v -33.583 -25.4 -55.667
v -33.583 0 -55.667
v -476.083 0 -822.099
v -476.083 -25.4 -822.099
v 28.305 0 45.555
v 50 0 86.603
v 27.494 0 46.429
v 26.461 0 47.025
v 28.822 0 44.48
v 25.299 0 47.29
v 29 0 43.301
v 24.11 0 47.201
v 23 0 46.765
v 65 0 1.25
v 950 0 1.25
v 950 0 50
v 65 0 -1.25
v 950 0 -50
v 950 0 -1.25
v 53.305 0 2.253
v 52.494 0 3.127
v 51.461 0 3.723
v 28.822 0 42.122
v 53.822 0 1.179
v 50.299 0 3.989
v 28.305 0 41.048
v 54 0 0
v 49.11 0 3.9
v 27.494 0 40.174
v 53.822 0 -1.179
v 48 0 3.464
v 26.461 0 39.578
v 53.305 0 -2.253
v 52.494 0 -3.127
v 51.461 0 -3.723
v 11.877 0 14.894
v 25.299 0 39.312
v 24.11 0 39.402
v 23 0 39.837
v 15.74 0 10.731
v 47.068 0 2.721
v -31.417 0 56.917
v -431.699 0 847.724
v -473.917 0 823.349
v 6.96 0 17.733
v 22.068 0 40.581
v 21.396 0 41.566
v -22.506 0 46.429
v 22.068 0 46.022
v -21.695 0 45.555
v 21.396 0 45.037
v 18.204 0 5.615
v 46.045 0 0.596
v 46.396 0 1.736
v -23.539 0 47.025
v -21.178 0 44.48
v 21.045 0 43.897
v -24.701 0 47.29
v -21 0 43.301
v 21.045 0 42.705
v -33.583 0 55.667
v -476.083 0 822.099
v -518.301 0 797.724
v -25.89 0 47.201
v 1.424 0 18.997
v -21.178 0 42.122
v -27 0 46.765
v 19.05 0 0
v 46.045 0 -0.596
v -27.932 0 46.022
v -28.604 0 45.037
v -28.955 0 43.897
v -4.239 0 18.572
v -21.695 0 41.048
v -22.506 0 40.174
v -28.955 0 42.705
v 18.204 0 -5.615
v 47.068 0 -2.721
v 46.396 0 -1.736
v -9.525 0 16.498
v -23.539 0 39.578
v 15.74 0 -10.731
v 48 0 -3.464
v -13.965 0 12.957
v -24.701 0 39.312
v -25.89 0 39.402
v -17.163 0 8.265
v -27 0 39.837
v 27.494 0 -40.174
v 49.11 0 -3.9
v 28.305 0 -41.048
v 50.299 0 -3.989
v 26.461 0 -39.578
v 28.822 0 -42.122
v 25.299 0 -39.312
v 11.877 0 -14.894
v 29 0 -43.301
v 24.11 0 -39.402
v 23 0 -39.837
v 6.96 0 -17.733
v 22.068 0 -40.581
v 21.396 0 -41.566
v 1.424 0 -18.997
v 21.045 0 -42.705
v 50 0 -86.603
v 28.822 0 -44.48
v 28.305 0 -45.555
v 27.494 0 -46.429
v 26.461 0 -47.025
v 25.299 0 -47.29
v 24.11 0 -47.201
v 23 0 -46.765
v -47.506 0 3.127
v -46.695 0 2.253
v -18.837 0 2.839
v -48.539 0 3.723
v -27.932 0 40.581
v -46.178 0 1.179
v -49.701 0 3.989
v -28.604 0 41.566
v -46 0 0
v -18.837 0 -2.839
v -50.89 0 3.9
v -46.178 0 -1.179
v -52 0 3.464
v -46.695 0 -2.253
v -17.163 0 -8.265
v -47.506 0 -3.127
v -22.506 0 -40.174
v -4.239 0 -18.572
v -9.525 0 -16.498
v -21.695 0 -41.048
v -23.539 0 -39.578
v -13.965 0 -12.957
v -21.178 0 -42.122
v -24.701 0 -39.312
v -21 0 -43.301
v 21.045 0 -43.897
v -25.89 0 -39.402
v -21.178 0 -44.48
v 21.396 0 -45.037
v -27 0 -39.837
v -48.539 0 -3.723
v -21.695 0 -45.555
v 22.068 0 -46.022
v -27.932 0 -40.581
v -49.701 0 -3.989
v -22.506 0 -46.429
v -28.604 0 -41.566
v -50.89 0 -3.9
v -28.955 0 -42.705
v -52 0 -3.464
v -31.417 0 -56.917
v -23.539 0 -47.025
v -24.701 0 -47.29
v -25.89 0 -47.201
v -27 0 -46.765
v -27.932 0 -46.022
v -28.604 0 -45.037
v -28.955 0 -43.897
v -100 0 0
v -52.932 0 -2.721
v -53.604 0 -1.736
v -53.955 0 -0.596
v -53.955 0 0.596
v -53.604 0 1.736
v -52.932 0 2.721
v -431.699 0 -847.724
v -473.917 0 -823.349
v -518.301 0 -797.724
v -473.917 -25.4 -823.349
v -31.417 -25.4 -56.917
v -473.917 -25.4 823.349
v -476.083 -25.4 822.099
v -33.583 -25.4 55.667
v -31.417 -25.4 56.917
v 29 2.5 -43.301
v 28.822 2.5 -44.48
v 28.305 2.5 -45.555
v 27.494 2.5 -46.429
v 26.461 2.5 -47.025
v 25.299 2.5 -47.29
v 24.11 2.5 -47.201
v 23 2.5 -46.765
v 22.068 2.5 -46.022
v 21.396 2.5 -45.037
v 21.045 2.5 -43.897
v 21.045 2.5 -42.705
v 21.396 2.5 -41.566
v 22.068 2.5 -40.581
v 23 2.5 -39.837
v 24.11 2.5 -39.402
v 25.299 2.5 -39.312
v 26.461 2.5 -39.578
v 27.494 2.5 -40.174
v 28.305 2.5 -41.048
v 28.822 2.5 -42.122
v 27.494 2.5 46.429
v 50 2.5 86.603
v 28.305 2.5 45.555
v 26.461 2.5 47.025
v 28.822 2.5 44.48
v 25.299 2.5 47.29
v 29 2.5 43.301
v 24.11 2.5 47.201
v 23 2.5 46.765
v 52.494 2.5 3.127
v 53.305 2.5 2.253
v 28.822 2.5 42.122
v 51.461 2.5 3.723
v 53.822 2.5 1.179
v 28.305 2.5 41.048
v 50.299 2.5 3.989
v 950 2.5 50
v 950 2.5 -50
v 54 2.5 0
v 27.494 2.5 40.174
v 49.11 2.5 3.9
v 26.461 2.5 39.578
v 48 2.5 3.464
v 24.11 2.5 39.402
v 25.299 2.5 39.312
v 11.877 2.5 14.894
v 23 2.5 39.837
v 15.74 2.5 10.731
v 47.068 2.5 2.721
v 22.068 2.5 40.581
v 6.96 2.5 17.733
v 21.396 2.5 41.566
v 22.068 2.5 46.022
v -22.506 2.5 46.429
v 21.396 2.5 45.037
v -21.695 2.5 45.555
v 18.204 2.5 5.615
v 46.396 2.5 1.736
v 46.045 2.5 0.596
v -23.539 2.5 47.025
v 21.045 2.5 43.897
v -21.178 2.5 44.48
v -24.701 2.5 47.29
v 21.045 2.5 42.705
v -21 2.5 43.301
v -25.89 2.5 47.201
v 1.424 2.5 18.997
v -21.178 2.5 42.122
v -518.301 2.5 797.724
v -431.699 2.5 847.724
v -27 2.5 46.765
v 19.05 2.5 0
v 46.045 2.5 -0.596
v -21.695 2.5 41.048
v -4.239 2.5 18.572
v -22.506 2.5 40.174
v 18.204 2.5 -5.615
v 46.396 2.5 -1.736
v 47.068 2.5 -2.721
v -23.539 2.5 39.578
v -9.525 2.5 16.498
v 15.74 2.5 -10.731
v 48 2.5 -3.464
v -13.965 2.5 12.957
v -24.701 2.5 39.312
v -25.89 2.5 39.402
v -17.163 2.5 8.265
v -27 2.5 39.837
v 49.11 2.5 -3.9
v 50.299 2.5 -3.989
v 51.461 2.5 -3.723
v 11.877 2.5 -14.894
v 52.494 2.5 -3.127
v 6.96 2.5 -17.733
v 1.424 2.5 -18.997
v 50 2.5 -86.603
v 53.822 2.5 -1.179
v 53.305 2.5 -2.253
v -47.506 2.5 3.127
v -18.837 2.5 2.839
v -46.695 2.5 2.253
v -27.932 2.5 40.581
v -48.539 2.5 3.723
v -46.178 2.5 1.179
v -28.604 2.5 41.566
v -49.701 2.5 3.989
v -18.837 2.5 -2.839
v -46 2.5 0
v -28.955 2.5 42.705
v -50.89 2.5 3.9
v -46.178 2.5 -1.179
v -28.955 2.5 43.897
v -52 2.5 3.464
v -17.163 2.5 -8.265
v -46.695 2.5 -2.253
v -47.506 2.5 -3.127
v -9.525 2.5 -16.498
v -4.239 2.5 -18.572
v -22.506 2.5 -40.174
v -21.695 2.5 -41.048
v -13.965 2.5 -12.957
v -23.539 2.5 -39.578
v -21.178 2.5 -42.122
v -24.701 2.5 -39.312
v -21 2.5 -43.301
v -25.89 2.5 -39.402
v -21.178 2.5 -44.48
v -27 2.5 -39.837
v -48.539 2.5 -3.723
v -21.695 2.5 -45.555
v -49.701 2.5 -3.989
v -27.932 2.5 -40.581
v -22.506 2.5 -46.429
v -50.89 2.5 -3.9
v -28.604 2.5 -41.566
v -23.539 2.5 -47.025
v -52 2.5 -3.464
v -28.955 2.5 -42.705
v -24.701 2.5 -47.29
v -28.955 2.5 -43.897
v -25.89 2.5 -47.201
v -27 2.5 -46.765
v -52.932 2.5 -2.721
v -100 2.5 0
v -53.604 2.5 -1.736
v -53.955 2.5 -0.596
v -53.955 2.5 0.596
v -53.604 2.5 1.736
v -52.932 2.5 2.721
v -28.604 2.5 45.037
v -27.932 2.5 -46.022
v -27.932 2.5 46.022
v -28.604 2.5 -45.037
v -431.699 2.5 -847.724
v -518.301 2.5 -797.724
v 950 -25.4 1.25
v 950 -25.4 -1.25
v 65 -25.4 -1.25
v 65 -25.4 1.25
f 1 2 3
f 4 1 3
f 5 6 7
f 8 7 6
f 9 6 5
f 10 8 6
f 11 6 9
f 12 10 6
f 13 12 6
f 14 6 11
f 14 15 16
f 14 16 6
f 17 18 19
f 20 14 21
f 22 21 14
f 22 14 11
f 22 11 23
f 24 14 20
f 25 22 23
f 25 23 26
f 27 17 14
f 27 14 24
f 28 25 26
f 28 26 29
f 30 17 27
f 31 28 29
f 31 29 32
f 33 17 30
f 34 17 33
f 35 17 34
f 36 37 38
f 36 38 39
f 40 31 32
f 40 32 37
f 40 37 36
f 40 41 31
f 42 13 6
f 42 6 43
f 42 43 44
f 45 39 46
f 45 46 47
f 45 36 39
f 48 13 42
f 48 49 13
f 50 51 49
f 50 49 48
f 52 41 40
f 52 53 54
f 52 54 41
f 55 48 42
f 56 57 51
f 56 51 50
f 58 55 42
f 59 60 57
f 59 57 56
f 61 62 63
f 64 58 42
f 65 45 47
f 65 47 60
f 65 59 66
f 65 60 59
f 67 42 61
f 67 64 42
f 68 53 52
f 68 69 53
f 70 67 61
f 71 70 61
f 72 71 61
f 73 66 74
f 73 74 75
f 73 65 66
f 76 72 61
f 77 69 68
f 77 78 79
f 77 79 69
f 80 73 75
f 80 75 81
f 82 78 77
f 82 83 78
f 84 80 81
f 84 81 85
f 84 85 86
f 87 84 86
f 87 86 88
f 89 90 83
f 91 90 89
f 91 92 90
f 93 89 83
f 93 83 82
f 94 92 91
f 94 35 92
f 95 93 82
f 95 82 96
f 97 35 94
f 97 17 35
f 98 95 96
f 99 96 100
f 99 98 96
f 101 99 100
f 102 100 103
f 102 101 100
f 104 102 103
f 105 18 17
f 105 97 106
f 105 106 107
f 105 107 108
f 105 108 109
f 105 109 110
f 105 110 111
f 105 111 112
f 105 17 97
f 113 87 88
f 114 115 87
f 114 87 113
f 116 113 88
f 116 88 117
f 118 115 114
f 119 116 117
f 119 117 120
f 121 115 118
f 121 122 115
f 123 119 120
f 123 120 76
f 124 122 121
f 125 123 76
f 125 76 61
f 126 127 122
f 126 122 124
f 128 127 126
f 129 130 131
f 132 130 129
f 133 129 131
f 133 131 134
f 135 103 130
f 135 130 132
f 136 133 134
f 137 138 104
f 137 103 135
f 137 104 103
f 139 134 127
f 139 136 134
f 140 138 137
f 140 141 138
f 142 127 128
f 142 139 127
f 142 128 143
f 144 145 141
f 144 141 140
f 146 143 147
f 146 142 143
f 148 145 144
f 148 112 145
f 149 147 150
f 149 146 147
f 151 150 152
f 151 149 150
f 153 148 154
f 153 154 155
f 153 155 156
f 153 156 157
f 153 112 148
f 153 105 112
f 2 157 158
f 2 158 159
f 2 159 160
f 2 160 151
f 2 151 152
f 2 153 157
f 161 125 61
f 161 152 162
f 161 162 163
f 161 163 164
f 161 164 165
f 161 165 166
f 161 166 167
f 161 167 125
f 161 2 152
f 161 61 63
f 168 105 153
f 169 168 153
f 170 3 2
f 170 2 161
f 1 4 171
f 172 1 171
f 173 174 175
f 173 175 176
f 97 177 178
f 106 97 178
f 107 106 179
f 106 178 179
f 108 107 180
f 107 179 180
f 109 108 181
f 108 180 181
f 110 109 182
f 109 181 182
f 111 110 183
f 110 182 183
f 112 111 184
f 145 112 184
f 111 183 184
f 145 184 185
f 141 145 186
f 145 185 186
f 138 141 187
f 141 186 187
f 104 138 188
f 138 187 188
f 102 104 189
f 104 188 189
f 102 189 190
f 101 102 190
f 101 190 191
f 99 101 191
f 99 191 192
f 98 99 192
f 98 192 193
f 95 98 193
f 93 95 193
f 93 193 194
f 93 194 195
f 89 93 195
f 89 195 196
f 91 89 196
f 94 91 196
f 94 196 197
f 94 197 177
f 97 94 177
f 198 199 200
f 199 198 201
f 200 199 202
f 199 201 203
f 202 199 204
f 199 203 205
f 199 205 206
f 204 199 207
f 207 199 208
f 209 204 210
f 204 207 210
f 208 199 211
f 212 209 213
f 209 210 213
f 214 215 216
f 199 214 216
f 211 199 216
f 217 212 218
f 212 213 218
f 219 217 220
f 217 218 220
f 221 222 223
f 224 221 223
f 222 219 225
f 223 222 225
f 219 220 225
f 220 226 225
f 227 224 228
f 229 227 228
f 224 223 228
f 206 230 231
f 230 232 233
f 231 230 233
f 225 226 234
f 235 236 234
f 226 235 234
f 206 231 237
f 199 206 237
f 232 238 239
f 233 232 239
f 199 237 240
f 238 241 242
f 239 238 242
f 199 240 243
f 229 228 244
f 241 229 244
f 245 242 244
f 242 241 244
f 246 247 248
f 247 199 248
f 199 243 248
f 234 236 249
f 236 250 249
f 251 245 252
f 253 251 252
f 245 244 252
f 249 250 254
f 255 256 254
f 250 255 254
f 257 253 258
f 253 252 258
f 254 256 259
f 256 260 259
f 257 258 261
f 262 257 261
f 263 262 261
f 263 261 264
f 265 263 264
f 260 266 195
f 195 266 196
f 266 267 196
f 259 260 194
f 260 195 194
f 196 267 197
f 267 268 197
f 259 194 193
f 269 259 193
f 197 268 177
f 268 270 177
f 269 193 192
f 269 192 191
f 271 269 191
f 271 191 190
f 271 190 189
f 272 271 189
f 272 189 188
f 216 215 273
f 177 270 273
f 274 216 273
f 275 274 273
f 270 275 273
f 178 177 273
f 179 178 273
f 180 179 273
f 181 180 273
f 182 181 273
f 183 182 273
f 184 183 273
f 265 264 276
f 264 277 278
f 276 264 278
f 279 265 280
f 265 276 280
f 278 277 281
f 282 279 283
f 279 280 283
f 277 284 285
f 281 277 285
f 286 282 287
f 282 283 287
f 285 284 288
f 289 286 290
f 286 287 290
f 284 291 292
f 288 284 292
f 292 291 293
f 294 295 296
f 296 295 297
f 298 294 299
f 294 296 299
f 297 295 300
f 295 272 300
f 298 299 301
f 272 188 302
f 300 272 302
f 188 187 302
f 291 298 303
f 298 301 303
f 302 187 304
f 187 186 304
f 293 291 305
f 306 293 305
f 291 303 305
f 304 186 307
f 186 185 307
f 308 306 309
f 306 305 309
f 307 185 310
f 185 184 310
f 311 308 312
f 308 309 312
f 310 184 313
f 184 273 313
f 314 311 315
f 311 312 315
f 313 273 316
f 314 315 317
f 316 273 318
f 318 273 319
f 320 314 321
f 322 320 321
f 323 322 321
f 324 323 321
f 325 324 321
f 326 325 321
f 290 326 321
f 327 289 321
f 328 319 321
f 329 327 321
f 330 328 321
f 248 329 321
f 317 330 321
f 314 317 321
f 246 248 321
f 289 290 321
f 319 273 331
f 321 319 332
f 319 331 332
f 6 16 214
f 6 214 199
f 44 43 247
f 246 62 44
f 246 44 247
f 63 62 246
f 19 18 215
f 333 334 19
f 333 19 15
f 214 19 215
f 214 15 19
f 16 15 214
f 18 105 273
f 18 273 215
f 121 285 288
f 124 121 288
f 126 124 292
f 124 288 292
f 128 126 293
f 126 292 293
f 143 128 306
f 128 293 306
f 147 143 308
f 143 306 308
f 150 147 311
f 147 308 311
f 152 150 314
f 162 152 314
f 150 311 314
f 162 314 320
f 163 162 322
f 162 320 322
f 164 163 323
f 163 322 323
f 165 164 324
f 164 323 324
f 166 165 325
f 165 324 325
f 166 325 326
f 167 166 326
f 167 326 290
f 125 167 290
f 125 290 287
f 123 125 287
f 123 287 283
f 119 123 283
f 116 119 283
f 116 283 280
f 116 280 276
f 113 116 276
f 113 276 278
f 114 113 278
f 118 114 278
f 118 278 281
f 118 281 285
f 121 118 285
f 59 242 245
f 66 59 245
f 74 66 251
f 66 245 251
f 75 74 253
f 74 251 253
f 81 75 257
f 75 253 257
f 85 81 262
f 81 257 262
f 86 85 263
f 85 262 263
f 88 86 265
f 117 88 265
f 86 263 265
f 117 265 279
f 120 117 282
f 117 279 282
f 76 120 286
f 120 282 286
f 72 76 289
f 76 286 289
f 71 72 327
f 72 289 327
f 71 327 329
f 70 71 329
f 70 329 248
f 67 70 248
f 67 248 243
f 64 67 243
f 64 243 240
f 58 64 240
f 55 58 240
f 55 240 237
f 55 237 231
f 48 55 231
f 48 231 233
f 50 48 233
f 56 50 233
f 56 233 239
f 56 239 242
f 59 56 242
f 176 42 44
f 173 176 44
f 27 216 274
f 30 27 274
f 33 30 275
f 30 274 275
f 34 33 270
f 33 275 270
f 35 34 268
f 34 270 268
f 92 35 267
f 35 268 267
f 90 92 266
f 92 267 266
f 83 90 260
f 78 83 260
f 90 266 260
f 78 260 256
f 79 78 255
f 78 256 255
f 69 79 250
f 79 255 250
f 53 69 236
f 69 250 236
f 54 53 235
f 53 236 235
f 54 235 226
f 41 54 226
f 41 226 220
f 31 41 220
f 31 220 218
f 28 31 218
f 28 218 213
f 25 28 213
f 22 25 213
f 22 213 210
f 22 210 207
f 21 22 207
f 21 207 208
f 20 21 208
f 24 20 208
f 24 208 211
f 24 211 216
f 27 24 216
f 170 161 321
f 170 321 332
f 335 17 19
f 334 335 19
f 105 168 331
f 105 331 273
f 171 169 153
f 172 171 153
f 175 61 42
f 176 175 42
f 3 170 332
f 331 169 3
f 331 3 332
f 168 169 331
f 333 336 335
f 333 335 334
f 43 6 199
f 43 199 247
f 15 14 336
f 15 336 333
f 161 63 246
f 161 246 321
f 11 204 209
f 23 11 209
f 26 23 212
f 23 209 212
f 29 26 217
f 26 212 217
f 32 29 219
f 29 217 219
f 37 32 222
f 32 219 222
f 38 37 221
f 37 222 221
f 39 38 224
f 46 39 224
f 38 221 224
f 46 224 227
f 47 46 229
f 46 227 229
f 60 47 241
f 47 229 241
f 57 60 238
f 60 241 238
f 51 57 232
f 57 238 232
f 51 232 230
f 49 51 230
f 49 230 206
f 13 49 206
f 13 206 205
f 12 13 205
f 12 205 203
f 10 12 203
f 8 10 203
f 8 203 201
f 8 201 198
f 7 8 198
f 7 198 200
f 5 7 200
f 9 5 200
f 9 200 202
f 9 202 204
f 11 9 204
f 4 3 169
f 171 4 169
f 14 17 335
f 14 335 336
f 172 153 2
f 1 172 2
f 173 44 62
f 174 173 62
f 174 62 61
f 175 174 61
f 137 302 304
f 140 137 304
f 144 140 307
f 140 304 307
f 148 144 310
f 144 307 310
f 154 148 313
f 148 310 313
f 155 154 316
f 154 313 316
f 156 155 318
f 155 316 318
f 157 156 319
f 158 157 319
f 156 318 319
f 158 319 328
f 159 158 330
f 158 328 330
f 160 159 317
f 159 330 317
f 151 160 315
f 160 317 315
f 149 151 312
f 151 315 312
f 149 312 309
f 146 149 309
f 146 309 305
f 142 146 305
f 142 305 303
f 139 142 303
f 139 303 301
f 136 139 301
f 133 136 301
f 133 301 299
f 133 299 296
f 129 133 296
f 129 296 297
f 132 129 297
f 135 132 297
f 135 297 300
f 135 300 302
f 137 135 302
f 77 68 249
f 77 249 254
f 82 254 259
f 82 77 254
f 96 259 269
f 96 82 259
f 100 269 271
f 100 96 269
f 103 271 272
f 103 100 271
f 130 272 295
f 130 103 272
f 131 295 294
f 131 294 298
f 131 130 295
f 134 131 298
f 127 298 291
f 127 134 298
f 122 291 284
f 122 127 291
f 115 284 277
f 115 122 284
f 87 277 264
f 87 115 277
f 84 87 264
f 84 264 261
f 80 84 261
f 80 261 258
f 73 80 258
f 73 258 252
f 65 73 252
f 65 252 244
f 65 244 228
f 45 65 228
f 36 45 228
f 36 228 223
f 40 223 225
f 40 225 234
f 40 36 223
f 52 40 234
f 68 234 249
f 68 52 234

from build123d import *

# Parameters (mm, degrees)
CROQUIS1_R              = 19.05
SALIENTE_EXTRUIR3_DEPTH = 2.5
CROQUIS2_W              = 885
CROQUIS2_H              = 2.5
SALIENTE_EXTRUIR4_DEPTH = 25.4
CROQUIS4_R              = 4
CORTAR_EXTRUIR1_DEPTH   = 2.54


with BuildPart() as part:
    # Croquis1 → Saliente-Extruir3 (new body)
    with BuildSketch(Plane(origin=(0, 0, 0), x_dir=(1, 0, 0), z_dir=(0, 1, 0))):
        Polygon((-431.698729811, -847.724133595), (-518.301270189, -797.724133595), (-100, 0), (-518.301270189, 797.724133595), (-431.698729811, 847.724133595), (50, 86.602540378), (950, 50), (950, -50), (50, -86.602540378), align=None)
        Circle(CROQUIS1_R, mode=Mode.SUBTRACT)
    extrude(amount=SALIENTE_EXTRUIR3_DEPTH)

    # Croquis2 → Saliente-Extruir4 (add)
    with BuildSketch(Plane.XZ):
        with Locations((507.5, 0)):
            Rectangle(CROQUIS2_W, CROQUIS2_H)
        Polygon((-473.917468245, -823.349133595), (-31.417468245, -56.916651246), (-33.582531755, -55.666651246), (-476.082531755, -822.099133595), align=None)
        Polygon((-476.082531755, 822.099133595), (-33.582531755, 55.666651246), (-31.417468245, 56.916651246), (-473.917468245, 823.349133595), align=None)
    extrude(amount=SALIENTE_EXTRUIR4_DEPTH)

    # Croquis4 → Cortar-Extruir1 (cut)
    with BuildSketch(Plane(origin=(0, 2.5, 0), x_dir=(1, 0, 0), z_dir=(0, 1, 0))):
        with Locations((25, -43.301270189)):
            Circle(CROQUIS4_R)
        with Locations((-25, -43.301270189)):
            Circle(CROQUIS4_R)
        with Locations((-50, 0)):
            Circle(CROQUIS4_R)
        with Locations((-25, 43.301270189)):
            Circle(CROQUIS4_R)
        with Locations((25, 43.301270189)):
            Circle(CROQUIS4_R)
        with Locations((50, 0)):
            Circle(CROQUIS4_R)
    extrude(amount=-CORTAR_EXTRUIR1_DEPTH, mode=Mode.SUBTRACT)


solid = part.part
